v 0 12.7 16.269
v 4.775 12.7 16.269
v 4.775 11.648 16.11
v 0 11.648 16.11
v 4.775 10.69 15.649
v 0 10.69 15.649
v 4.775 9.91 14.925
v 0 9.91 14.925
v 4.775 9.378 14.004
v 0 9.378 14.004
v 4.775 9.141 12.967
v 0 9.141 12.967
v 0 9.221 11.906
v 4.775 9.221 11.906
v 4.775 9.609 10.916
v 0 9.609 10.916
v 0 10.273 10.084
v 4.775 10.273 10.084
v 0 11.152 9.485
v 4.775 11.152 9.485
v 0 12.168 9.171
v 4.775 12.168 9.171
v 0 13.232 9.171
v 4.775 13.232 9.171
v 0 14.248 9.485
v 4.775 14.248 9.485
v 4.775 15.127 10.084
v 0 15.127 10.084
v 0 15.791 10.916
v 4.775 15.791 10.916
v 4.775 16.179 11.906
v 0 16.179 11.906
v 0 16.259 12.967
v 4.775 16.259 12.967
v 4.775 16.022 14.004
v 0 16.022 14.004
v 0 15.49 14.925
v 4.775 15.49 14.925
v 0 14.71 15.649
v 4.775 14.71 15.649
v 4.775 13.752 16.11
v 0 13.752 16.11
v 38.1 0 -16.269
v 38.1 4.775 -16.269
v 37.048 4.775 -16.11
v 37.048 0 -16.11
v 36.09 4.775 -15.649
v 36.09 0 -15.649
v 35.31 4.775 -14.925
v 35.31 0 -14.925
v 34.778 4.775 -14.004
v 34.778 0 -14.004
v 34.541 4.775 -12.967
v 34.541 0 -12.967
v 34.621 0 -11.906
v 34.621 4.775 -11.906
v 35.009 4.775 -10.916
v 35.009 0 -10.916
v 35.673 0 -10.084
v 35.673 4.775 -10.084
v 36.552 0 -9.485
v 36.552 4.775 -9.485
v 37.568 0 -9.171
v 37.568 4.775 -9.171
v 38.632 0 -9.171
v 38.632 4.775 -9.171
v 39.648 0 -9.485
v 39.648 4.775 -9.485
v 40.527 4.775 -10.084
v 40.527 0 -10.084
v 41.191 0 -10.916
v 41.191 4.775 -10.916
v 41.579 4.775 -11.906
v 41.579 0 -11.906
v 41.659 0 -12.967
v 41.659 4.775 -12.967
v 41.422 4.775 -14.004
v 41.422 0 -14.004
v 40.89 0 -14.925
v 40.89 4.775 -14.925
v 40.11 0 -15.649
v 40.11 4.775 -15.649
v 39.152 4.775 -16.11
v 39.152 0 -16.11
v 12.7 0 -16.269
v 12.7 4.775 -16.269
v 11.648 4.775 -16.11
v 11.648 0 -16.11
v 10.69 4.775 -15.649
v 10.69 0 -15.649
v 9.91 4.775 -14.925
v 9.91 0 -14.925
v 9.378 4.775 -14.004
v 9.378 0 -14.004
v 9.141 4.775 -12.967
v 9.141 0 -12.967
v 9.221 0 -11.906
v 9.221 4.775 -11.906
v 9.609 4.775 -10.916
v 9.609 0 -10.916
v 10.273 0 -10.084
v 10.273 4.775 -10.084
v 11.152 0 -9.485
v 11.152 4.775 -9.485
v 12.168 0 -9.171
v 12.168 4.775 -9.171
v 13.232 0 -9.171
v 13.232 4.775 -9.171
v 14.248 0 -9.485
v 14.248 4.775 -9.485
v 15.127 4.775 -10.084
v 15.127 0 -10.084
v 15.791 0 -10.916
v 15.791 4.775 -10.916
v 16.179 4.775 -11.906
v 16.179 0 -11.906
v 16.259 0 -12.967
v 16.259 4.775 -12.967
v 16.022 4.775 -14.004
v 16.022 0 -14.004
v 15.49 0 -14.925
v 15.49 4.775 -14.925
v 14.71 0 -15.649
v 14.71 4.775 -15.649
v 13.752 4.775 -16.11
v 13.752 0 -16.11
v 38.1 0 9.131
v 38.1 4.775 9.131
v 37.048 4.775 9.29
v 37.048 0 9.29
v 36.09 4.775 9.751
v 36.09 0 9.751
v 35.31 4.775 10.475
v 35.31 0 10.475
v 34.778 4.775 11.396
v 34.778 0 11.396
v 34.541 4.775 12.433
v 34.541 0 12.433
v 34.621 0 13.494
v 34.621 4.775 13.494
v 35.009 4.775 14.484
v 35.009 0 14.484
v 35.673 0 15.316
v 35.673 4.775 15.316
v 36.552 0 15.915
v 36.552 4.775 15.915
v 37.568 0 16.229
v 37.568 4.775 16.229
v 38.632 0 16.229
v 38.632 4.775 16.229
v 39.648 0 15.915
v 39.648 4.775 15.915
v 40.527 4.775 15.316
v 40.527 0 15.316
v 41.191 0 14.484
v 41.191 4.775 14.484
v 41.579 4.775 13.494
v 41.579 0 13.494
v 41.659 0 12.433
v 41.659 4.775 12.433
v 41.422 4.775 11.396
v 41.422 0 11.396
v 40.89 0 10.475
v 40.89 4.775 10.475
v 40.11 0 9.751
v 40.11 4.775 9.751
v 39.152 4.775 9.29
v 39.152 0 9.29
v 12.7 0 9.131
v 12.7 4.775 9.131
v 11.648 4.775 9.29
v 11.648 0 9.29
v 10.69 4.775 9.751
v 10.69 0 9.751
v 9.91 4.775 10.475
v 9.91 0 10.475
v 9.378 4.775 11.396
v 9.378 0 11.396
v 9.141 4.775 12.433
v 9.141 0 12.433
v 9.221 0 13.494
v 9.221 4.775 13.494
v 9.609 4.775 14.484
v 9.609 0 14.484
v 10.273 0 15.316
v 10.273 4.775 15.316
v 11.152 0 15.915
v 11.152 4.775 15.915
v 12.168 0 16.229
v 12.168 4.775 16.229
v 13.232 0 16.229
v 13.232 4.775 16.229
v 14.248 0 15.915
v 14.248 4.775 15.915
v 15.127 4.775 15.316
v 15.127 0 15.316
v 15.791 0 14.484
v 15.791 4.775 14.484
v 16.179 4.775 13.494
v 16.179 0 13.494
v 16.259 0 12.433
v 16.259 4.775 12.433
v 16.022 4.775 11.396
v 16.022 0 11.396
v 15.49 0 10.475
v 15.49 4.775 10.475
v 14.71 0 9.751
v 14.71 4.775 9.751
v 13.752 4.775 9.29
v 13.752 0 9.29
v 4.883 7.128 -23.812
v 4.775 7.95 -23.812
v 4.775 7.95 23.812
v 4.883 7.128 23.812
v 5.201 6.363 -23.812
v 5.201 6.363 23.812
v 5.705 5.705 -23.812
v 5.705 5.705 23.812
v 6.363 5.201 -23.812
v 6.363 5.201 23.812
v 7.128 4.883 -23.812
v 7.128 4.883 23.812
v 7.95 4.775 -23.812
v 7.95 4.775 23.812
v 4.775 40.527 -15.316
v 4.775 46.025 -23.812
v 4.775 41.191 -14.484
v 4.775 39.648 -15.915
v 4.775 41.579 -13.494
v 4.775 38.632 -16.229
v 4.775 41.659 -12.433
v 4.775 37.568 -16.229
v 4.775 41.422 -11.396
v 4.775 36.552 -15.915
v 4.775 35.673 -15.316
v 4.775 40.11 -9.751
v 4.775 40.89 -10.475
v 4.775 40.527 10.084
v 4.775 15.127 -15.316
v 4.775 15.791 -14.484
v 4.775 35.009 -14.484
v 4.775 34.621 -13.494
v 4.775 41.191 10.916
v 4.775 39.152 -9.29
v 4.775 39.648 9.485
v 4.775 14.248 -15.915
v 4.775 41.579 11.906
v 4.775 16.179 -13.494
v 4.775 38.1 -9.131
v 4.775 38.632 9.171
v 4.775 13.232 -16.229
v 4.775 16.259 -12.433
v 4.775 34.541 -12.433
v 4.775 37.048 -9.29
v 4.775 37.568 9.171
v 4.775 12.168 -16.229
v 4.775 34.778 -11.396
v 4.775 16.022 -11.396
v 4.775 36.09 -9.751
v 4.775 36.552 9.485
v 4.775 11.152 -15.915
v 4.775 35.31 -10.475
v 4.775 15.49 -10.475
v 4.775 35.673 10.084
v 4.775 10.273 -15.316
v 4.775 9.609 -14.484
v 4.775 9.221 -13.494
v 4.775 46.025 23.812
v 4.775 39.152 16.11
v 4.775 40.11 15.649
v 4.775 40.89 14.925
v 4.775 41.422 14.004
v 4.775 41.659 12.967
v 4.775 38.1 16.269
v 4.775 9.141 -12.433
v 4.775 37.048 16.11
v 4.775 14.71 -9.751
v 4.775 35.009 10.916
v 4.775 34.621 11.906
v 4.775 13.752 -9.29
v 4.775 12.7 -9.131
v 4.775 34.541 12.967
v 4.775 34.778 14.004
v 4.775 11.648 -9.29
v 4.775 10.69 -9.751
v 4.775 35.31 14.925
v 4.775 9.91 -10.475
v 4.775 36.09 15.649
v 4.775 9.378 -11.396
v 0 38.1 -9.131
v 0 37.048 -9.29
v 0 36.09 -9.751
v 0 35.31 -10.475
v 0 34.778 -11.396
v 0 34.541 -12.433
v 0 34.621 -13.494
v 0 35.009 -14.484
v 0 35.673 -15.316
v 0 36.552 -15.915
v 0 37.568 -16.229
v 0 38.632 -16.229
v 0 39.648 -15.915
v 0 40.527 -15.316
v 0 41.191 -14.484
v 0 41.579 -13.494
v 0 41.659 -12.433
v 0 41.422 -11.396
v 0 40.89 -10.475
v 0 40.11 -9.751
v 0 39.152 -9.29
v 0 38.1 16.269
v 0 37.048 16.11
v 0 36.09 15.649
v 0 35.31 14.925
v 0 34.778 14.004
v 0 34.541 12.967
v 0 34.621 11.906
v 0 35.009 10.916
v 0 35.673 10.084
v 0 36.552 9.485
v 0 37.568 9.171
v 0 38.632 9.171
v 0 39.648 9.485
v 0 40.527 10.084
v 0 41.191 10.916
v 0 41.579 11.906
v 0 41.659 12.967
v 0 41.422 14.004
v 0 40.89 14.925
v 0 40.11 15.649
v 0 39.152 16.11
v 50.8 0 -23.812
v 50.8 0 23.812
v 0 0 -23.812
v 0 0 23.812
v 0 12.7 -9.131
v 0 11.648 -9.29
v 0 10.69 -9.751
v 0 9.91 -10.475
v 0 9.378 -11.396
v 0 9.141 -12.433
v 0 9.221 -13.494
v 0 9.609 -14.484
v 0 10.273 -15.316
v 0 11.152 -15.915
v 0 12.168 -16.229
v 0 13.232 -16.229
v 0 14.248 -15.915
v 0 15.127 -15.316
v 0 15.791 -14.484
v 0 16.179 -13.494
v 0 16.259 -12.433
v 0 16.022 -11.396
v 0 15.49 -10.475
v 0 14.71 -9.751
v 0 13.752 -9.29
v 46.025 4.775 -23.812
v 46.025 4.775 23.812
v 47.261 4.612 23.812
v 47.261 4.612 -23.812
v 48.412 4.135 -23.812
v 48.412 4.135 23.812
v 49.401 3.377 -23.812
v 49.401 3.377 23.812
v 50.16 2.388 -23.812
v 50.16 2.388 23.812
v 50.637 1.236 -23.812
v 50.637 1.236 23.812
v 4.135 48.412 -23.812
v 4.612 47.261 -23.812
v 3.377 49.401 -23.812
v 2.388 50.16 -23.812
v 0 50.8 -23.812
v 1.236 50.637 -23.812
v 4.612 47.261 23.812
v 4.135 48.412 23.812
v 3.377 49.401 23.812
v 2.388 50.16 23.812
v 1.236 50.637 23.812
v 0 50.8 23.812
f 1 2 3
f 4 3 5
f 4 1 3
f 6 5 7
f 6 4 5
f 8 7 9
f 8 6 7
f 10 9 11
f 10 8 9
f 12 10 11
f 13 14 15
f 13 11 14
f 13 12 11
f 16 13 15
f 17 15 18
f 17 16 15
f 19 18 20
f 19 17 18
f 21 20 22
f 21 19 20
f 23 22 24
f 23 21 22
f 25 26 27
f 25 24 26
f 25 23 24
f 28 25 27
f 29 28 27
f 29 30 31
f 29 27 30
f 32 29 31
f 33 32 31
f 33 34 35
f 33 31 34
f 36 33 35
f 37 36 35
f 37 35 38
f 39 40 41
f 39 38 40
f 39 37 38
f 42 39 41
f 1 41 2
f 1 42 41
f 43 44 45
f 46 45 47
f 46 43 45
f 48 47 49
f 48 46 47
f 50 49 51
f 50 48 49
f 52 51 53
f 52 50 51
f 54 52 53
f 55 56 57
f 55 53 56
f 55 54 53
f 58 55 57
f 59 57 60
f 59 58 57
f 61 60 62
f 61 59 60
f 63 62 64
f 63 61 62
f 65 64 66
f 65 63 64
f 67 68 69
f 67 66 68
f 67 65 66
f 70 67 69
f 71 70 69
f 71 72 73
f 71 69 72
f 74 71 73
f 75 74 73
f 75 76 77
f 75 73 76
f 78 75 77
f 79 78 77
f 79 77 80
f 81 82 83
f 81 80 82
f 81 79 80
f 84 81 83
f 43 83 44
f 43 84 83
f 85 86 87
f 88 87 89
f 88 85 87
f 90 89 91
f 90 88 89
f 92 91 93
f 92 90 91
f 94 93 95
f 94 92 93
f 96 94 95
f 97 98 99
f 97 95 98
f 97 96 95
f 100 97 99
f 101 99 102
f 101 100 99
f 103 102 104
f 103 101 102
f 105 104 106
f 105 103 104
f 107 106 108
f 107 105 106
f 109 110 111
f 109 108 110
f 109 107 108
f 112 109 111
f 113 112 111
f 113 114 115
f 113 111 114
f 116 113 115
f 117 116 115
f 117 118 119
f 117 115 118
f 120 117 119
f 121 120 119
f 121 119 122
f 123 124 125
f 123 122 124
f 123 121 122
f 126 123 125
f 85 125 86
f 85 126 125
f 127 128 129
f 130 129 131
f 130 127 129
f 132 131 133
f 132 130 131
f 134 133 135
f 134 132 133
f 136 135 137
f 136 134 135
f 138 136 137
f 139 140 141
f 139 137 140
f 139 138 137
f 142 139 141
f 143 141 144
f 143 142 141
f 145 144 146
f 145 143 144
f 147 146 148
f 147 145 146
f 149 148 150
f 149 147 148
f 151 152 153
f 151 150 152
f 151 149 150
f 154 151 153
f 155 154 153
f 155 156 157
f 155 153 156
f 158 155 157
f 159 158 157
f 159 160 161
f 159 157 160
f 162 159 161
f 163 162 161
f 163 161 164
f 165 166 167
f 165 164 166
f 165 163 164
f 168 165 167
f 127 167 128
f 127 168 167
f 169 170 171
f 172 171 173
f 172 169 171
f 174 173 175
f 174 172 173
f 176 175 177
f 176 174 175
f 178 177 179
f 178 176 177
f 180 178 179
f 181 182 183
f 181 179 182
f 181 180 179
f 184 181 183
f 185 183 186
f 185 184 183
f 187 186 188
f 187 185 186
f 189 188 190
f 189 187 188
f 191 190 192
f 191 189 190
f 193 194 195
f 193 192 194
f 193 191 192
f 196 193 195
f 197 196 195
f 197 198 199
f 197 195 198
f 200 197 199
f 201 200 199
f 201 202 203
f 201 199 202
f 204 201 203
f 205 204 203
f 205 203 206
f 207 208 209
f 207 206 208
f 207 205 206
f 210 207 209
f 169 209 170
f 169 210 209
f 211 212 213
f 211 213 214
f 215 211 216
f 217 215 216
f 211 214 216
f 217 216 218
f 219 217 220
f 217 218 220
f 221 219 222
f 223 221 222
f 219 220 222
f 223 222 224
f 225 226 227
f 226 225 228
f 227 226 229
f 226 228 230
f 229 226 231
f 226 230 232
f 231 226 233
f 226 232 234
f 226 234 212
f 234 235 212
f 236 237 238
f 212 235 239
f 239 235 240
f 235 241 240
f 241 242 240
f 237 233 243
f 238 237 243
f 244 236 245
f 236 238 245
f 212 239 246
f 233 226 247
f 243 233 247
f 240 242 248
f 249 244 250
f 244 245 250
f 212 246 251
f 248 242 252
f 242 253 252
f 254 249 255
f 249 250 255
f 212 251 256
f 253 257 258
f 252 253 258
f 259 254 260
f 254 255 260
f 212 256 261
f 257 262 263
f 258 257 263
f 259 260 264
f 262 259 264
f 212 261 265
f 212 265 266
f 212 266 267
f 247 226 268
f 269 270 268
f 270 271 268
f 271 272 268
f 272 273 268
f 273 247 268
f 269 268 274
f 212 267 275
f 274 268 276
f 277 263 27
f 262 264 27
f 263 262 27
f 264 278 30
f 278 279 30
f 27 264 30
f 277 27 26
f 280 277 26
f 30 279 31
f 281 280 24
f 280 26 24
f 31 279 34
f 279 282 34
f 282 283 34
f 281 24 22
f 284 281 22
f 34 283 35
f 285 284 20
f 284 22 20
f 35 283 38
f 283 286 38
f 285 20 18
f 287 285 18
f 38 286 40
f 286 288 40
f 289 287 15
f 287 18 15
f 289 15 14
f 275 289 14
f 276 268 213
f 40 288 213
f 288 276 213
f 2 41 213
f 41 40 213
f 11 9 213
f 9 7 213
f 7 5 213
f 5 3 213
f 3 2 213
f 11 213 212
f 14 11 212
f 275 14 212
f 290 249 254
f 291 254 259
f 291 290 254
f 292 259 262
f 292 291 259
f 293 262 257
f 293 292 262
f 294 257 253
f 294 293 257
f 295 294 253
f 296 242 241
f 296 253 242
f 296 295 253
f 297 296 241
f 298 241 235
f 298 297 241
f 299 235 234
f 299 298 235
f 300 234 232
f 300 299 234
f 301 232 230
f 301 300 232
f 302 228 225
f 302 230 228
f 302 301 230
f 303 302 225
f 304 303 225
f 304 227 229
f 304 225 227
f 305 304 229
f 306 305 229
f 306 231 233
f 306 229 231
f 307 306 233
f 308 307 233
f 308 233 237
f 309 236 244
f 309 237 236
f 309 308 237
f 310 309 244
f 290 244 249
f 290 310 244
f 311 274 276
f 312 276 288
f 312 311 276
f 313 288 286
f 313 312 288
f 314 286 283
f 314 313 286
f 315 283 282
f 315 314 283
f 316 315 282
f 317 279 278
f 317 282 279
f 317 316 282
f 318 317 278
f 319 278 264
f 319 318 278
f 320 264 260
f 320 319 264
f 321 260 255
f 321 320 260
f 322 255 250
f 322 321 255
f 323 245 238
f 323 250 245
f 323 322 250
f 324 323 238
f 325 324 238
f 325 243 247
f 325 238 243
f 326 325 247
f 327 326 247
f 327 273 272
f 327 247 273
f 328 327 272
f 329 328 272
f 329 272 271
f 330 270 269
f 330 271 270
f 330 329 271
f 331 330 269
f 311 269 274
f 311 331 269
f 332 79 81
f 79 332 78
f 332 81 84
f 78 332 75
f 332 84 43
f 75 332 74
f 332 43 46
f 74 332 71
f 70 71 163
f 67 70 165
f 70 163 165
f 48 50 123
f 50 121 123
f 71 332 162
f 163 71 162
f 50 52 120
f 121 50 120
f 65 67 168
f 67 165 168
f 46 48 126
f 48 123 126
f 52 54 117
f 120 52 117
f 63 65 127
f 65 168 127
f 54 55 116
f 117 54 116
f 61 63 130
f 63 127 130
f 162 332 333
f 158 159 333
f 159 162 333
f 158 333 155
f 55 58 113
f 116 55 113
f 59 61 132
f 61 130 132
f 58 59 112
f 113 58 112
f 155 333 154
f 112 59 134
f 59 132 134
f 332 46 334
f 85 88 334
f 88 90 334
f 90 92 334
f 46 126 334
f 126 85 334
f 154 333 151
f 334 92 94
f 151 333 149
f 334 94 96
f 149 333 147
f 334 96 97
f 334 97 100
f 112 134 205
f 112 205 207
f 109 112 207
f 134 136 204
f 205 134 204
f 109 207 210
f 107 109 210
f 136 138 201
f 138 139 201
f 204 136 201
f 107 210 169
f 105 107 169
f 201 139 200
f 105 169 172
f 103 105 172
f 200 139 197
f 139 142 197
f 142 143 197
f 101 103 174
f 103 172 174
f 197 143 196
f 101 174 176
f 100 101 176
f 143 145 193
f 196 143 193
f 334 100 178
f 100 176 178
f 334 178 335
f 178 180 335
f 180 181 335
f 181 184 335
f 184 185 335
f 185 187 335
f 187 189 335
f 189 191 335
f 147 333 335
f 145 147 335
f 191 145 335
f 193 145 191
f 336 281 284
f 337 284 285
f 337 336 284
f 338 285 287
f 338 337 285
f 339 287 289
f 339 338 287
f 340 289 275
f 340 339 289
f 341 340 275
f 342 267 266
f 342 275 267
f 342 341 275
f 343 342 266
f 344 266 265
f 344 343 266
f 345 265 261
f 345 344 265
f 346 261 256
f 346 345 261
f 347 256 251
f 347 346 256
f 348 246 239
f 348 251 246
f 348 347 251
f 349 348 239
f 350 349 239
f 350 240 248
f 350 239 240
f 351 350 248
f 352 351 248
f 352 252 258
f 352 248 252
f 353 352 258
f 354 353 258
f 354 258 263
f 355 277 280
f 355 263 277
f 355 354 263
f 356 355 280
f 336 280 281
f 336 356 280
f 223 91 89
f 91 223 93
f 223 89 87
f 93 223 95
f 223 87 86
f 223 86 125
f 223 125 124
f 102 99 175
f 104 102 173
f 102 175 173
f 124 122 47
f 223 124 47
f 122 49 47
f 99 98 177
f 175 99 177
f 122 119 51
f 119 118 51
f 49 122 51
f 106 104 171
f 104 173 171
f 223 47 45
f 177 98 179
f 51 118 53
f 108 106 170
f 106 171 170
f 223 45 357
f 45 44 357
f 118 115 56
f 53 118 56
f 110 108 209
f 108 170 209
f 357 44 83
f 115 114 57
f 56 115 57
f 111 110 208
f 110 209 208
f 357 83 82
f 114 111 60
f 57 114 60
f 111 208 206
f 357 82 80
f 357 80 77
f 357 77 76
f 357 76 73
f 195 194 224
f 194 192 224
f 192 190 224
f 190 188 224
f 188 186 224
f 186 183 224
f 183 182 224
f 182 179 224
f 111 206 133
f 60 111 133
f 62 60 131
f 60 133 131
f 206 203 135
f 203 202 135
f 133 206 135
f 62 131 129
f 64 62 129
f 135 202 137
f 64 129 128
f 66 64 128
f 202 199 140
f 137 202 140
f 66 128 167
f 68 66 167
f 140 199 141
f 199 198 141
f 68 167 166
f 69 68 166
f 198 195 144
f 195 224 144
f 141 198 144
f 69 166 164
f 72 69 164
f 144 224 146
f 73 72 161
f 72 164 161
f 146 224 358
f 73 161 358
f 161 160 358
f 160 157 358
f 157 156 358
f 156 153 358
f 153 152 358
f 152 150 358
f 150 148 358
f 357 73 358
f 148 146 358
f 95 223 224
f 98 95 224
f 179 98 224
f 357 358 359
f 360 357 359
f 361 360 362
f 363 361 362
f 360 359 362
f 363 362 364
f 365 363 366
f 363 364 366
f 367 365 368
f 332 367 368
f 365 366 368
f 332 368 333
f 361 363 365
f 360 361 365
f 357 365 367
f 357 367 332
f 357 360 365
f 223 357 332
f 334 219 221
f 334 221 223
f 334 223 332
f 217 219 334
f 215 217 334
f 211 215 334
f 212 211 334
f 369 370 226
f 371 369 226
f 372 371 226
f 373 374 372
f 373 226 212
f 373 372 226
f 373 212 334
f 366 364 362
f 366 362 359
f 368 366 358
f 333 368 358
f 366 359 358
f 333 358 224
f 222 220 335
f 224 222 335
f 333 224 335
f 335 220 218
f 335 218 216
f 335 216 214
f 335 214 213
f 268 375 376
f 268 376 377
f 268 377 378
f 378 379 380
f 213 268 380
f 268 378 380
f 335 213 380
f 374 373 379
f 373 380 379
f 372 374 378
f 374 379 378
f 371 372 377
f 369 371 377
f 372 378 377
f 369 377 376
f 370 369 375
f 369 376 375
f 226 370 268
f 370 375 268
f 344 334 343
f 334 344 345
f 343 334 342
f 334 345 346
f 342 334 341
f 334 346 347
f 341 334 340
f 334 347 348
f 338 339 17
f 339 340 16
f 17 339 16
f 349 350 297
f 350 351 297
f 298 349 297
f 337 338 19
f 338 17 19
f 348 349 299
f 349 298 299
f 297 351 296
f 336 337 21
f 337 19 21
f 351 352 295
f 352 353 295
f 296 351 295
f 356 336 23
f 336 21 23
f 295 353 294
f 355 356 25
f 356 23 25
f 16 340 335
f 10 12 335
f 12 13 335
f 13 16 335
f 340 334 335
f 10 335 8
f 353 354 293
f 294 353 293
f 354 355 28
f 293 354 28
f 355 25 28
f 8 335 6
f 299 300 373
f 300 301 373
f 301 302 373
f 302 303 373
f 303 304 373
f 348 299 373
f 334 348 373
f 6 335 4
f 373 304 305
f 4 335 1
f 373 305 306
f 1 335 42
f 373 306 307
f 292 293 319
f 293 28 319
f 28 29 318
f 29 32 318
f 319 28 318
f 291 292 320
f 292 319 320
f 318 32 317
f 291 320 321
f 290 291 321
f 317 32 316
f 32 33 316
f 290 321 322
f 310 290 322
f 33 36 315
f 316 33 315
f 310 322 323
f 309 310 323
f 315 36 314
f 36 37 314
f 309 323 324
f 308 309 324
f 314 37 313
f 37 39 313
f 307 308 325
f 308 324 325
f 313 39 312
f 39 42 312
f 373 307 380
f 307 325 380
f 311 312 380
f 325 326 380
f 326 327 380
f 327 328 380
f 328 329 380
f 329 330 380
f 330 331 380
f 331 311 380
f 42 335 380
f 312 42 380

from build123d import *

# Parameters (mm, degrees)
BOSS_EXTRUDE1_DEPTH = 23.8125
SKETCH2_R           = 3.5687
CUT_EXTRUDE1_DEPTH  = 76.685633751
SKETCH3_R           = 3.5687
CUT_EXTRUDE2_DEPTH  = 76.685633751


with BuildPart() as part:
    # Sketch1 → Boss-Extrude1 (new, symmetric)
    with BuildSketch(Plane.XY):
        with BuildLine():
            Line((0, 0), (0, 50.8))
            ThreePointArc((0, 50.8), (3.376576302, 49.401376302), (4.7752, 46.0248))
            Line((4.7752, 46.0248), (4.7752, 7.9502))
            ThreePointArc((4.7752, 7.9502), (5.70513597, 5.70513597), (7.9502, 4.7752))
            Line((7.9502, 4.7752), (46.0248, 4.7752))
            ThreePointArc((46.0248, 4.7752), (49.401376302, 3.376576302), (50.8, 0))
            Line((50.8, 0), (0, 0))
        make_face()
    extrude(amount=BOSS_EXTRUDE1_DEPTH, both=True)

    # Sketch2 → Cut-Extrude1 (cut, through all)
    with BuildSketch(Plane(origin=(0, 0, 0), x_dir=(1, 0, 0), z_dir=(0, 1, 0))):
        with Locations(Location((12.7, -12.7, 0), (0, 0, 90))):
            Circle(SKETCH2_R)
        with Locations(Location((38.1, -12.7, 0), (0, 0, 90))):
            Circle(SKETCH2_R)
        with Locations(Location((12.7, 12.7, 0), (0, 0, 90))):
            Circle(SKETCH2_R)
        with Locations(Location((38.1, 12.7, 0), (0, 0, 90))):
            Circle(SKETCH2_R)
    extrude(amount=CUT_EXTRUDE1_DEPTH, mode=Mode.SUBTRACT)

    # Sketch3 → Cut-Extrude2 (cut, through all)
    with BuildSketch(Plane(origin=(0, 0, 0), x_dir=(0, 0, -1), z_dir=(1, 0, 0))):
        with Locations(Location((-12.7, 12.7, 0), (0, 0, 180))):
            Circle(SKETCH3_R)
        with Locations(Location((-12.7, 38.1, 0), (0, 0, 180))):
            Circle(SKETCH3_R)
        with Locations(Location((12.7, 12.7, 0), (0, 0, 180))):
            Circle(SKETCH3_R)
        with Locations(Location((12.7, 38.1, 0), (0, 0, 180))):
            Circle(SKETCH3_R)
    extrude(amount=CUT_EXTRUDE2_DEPTH, mode=Mode.SUBTRACT)


solid = part.part
